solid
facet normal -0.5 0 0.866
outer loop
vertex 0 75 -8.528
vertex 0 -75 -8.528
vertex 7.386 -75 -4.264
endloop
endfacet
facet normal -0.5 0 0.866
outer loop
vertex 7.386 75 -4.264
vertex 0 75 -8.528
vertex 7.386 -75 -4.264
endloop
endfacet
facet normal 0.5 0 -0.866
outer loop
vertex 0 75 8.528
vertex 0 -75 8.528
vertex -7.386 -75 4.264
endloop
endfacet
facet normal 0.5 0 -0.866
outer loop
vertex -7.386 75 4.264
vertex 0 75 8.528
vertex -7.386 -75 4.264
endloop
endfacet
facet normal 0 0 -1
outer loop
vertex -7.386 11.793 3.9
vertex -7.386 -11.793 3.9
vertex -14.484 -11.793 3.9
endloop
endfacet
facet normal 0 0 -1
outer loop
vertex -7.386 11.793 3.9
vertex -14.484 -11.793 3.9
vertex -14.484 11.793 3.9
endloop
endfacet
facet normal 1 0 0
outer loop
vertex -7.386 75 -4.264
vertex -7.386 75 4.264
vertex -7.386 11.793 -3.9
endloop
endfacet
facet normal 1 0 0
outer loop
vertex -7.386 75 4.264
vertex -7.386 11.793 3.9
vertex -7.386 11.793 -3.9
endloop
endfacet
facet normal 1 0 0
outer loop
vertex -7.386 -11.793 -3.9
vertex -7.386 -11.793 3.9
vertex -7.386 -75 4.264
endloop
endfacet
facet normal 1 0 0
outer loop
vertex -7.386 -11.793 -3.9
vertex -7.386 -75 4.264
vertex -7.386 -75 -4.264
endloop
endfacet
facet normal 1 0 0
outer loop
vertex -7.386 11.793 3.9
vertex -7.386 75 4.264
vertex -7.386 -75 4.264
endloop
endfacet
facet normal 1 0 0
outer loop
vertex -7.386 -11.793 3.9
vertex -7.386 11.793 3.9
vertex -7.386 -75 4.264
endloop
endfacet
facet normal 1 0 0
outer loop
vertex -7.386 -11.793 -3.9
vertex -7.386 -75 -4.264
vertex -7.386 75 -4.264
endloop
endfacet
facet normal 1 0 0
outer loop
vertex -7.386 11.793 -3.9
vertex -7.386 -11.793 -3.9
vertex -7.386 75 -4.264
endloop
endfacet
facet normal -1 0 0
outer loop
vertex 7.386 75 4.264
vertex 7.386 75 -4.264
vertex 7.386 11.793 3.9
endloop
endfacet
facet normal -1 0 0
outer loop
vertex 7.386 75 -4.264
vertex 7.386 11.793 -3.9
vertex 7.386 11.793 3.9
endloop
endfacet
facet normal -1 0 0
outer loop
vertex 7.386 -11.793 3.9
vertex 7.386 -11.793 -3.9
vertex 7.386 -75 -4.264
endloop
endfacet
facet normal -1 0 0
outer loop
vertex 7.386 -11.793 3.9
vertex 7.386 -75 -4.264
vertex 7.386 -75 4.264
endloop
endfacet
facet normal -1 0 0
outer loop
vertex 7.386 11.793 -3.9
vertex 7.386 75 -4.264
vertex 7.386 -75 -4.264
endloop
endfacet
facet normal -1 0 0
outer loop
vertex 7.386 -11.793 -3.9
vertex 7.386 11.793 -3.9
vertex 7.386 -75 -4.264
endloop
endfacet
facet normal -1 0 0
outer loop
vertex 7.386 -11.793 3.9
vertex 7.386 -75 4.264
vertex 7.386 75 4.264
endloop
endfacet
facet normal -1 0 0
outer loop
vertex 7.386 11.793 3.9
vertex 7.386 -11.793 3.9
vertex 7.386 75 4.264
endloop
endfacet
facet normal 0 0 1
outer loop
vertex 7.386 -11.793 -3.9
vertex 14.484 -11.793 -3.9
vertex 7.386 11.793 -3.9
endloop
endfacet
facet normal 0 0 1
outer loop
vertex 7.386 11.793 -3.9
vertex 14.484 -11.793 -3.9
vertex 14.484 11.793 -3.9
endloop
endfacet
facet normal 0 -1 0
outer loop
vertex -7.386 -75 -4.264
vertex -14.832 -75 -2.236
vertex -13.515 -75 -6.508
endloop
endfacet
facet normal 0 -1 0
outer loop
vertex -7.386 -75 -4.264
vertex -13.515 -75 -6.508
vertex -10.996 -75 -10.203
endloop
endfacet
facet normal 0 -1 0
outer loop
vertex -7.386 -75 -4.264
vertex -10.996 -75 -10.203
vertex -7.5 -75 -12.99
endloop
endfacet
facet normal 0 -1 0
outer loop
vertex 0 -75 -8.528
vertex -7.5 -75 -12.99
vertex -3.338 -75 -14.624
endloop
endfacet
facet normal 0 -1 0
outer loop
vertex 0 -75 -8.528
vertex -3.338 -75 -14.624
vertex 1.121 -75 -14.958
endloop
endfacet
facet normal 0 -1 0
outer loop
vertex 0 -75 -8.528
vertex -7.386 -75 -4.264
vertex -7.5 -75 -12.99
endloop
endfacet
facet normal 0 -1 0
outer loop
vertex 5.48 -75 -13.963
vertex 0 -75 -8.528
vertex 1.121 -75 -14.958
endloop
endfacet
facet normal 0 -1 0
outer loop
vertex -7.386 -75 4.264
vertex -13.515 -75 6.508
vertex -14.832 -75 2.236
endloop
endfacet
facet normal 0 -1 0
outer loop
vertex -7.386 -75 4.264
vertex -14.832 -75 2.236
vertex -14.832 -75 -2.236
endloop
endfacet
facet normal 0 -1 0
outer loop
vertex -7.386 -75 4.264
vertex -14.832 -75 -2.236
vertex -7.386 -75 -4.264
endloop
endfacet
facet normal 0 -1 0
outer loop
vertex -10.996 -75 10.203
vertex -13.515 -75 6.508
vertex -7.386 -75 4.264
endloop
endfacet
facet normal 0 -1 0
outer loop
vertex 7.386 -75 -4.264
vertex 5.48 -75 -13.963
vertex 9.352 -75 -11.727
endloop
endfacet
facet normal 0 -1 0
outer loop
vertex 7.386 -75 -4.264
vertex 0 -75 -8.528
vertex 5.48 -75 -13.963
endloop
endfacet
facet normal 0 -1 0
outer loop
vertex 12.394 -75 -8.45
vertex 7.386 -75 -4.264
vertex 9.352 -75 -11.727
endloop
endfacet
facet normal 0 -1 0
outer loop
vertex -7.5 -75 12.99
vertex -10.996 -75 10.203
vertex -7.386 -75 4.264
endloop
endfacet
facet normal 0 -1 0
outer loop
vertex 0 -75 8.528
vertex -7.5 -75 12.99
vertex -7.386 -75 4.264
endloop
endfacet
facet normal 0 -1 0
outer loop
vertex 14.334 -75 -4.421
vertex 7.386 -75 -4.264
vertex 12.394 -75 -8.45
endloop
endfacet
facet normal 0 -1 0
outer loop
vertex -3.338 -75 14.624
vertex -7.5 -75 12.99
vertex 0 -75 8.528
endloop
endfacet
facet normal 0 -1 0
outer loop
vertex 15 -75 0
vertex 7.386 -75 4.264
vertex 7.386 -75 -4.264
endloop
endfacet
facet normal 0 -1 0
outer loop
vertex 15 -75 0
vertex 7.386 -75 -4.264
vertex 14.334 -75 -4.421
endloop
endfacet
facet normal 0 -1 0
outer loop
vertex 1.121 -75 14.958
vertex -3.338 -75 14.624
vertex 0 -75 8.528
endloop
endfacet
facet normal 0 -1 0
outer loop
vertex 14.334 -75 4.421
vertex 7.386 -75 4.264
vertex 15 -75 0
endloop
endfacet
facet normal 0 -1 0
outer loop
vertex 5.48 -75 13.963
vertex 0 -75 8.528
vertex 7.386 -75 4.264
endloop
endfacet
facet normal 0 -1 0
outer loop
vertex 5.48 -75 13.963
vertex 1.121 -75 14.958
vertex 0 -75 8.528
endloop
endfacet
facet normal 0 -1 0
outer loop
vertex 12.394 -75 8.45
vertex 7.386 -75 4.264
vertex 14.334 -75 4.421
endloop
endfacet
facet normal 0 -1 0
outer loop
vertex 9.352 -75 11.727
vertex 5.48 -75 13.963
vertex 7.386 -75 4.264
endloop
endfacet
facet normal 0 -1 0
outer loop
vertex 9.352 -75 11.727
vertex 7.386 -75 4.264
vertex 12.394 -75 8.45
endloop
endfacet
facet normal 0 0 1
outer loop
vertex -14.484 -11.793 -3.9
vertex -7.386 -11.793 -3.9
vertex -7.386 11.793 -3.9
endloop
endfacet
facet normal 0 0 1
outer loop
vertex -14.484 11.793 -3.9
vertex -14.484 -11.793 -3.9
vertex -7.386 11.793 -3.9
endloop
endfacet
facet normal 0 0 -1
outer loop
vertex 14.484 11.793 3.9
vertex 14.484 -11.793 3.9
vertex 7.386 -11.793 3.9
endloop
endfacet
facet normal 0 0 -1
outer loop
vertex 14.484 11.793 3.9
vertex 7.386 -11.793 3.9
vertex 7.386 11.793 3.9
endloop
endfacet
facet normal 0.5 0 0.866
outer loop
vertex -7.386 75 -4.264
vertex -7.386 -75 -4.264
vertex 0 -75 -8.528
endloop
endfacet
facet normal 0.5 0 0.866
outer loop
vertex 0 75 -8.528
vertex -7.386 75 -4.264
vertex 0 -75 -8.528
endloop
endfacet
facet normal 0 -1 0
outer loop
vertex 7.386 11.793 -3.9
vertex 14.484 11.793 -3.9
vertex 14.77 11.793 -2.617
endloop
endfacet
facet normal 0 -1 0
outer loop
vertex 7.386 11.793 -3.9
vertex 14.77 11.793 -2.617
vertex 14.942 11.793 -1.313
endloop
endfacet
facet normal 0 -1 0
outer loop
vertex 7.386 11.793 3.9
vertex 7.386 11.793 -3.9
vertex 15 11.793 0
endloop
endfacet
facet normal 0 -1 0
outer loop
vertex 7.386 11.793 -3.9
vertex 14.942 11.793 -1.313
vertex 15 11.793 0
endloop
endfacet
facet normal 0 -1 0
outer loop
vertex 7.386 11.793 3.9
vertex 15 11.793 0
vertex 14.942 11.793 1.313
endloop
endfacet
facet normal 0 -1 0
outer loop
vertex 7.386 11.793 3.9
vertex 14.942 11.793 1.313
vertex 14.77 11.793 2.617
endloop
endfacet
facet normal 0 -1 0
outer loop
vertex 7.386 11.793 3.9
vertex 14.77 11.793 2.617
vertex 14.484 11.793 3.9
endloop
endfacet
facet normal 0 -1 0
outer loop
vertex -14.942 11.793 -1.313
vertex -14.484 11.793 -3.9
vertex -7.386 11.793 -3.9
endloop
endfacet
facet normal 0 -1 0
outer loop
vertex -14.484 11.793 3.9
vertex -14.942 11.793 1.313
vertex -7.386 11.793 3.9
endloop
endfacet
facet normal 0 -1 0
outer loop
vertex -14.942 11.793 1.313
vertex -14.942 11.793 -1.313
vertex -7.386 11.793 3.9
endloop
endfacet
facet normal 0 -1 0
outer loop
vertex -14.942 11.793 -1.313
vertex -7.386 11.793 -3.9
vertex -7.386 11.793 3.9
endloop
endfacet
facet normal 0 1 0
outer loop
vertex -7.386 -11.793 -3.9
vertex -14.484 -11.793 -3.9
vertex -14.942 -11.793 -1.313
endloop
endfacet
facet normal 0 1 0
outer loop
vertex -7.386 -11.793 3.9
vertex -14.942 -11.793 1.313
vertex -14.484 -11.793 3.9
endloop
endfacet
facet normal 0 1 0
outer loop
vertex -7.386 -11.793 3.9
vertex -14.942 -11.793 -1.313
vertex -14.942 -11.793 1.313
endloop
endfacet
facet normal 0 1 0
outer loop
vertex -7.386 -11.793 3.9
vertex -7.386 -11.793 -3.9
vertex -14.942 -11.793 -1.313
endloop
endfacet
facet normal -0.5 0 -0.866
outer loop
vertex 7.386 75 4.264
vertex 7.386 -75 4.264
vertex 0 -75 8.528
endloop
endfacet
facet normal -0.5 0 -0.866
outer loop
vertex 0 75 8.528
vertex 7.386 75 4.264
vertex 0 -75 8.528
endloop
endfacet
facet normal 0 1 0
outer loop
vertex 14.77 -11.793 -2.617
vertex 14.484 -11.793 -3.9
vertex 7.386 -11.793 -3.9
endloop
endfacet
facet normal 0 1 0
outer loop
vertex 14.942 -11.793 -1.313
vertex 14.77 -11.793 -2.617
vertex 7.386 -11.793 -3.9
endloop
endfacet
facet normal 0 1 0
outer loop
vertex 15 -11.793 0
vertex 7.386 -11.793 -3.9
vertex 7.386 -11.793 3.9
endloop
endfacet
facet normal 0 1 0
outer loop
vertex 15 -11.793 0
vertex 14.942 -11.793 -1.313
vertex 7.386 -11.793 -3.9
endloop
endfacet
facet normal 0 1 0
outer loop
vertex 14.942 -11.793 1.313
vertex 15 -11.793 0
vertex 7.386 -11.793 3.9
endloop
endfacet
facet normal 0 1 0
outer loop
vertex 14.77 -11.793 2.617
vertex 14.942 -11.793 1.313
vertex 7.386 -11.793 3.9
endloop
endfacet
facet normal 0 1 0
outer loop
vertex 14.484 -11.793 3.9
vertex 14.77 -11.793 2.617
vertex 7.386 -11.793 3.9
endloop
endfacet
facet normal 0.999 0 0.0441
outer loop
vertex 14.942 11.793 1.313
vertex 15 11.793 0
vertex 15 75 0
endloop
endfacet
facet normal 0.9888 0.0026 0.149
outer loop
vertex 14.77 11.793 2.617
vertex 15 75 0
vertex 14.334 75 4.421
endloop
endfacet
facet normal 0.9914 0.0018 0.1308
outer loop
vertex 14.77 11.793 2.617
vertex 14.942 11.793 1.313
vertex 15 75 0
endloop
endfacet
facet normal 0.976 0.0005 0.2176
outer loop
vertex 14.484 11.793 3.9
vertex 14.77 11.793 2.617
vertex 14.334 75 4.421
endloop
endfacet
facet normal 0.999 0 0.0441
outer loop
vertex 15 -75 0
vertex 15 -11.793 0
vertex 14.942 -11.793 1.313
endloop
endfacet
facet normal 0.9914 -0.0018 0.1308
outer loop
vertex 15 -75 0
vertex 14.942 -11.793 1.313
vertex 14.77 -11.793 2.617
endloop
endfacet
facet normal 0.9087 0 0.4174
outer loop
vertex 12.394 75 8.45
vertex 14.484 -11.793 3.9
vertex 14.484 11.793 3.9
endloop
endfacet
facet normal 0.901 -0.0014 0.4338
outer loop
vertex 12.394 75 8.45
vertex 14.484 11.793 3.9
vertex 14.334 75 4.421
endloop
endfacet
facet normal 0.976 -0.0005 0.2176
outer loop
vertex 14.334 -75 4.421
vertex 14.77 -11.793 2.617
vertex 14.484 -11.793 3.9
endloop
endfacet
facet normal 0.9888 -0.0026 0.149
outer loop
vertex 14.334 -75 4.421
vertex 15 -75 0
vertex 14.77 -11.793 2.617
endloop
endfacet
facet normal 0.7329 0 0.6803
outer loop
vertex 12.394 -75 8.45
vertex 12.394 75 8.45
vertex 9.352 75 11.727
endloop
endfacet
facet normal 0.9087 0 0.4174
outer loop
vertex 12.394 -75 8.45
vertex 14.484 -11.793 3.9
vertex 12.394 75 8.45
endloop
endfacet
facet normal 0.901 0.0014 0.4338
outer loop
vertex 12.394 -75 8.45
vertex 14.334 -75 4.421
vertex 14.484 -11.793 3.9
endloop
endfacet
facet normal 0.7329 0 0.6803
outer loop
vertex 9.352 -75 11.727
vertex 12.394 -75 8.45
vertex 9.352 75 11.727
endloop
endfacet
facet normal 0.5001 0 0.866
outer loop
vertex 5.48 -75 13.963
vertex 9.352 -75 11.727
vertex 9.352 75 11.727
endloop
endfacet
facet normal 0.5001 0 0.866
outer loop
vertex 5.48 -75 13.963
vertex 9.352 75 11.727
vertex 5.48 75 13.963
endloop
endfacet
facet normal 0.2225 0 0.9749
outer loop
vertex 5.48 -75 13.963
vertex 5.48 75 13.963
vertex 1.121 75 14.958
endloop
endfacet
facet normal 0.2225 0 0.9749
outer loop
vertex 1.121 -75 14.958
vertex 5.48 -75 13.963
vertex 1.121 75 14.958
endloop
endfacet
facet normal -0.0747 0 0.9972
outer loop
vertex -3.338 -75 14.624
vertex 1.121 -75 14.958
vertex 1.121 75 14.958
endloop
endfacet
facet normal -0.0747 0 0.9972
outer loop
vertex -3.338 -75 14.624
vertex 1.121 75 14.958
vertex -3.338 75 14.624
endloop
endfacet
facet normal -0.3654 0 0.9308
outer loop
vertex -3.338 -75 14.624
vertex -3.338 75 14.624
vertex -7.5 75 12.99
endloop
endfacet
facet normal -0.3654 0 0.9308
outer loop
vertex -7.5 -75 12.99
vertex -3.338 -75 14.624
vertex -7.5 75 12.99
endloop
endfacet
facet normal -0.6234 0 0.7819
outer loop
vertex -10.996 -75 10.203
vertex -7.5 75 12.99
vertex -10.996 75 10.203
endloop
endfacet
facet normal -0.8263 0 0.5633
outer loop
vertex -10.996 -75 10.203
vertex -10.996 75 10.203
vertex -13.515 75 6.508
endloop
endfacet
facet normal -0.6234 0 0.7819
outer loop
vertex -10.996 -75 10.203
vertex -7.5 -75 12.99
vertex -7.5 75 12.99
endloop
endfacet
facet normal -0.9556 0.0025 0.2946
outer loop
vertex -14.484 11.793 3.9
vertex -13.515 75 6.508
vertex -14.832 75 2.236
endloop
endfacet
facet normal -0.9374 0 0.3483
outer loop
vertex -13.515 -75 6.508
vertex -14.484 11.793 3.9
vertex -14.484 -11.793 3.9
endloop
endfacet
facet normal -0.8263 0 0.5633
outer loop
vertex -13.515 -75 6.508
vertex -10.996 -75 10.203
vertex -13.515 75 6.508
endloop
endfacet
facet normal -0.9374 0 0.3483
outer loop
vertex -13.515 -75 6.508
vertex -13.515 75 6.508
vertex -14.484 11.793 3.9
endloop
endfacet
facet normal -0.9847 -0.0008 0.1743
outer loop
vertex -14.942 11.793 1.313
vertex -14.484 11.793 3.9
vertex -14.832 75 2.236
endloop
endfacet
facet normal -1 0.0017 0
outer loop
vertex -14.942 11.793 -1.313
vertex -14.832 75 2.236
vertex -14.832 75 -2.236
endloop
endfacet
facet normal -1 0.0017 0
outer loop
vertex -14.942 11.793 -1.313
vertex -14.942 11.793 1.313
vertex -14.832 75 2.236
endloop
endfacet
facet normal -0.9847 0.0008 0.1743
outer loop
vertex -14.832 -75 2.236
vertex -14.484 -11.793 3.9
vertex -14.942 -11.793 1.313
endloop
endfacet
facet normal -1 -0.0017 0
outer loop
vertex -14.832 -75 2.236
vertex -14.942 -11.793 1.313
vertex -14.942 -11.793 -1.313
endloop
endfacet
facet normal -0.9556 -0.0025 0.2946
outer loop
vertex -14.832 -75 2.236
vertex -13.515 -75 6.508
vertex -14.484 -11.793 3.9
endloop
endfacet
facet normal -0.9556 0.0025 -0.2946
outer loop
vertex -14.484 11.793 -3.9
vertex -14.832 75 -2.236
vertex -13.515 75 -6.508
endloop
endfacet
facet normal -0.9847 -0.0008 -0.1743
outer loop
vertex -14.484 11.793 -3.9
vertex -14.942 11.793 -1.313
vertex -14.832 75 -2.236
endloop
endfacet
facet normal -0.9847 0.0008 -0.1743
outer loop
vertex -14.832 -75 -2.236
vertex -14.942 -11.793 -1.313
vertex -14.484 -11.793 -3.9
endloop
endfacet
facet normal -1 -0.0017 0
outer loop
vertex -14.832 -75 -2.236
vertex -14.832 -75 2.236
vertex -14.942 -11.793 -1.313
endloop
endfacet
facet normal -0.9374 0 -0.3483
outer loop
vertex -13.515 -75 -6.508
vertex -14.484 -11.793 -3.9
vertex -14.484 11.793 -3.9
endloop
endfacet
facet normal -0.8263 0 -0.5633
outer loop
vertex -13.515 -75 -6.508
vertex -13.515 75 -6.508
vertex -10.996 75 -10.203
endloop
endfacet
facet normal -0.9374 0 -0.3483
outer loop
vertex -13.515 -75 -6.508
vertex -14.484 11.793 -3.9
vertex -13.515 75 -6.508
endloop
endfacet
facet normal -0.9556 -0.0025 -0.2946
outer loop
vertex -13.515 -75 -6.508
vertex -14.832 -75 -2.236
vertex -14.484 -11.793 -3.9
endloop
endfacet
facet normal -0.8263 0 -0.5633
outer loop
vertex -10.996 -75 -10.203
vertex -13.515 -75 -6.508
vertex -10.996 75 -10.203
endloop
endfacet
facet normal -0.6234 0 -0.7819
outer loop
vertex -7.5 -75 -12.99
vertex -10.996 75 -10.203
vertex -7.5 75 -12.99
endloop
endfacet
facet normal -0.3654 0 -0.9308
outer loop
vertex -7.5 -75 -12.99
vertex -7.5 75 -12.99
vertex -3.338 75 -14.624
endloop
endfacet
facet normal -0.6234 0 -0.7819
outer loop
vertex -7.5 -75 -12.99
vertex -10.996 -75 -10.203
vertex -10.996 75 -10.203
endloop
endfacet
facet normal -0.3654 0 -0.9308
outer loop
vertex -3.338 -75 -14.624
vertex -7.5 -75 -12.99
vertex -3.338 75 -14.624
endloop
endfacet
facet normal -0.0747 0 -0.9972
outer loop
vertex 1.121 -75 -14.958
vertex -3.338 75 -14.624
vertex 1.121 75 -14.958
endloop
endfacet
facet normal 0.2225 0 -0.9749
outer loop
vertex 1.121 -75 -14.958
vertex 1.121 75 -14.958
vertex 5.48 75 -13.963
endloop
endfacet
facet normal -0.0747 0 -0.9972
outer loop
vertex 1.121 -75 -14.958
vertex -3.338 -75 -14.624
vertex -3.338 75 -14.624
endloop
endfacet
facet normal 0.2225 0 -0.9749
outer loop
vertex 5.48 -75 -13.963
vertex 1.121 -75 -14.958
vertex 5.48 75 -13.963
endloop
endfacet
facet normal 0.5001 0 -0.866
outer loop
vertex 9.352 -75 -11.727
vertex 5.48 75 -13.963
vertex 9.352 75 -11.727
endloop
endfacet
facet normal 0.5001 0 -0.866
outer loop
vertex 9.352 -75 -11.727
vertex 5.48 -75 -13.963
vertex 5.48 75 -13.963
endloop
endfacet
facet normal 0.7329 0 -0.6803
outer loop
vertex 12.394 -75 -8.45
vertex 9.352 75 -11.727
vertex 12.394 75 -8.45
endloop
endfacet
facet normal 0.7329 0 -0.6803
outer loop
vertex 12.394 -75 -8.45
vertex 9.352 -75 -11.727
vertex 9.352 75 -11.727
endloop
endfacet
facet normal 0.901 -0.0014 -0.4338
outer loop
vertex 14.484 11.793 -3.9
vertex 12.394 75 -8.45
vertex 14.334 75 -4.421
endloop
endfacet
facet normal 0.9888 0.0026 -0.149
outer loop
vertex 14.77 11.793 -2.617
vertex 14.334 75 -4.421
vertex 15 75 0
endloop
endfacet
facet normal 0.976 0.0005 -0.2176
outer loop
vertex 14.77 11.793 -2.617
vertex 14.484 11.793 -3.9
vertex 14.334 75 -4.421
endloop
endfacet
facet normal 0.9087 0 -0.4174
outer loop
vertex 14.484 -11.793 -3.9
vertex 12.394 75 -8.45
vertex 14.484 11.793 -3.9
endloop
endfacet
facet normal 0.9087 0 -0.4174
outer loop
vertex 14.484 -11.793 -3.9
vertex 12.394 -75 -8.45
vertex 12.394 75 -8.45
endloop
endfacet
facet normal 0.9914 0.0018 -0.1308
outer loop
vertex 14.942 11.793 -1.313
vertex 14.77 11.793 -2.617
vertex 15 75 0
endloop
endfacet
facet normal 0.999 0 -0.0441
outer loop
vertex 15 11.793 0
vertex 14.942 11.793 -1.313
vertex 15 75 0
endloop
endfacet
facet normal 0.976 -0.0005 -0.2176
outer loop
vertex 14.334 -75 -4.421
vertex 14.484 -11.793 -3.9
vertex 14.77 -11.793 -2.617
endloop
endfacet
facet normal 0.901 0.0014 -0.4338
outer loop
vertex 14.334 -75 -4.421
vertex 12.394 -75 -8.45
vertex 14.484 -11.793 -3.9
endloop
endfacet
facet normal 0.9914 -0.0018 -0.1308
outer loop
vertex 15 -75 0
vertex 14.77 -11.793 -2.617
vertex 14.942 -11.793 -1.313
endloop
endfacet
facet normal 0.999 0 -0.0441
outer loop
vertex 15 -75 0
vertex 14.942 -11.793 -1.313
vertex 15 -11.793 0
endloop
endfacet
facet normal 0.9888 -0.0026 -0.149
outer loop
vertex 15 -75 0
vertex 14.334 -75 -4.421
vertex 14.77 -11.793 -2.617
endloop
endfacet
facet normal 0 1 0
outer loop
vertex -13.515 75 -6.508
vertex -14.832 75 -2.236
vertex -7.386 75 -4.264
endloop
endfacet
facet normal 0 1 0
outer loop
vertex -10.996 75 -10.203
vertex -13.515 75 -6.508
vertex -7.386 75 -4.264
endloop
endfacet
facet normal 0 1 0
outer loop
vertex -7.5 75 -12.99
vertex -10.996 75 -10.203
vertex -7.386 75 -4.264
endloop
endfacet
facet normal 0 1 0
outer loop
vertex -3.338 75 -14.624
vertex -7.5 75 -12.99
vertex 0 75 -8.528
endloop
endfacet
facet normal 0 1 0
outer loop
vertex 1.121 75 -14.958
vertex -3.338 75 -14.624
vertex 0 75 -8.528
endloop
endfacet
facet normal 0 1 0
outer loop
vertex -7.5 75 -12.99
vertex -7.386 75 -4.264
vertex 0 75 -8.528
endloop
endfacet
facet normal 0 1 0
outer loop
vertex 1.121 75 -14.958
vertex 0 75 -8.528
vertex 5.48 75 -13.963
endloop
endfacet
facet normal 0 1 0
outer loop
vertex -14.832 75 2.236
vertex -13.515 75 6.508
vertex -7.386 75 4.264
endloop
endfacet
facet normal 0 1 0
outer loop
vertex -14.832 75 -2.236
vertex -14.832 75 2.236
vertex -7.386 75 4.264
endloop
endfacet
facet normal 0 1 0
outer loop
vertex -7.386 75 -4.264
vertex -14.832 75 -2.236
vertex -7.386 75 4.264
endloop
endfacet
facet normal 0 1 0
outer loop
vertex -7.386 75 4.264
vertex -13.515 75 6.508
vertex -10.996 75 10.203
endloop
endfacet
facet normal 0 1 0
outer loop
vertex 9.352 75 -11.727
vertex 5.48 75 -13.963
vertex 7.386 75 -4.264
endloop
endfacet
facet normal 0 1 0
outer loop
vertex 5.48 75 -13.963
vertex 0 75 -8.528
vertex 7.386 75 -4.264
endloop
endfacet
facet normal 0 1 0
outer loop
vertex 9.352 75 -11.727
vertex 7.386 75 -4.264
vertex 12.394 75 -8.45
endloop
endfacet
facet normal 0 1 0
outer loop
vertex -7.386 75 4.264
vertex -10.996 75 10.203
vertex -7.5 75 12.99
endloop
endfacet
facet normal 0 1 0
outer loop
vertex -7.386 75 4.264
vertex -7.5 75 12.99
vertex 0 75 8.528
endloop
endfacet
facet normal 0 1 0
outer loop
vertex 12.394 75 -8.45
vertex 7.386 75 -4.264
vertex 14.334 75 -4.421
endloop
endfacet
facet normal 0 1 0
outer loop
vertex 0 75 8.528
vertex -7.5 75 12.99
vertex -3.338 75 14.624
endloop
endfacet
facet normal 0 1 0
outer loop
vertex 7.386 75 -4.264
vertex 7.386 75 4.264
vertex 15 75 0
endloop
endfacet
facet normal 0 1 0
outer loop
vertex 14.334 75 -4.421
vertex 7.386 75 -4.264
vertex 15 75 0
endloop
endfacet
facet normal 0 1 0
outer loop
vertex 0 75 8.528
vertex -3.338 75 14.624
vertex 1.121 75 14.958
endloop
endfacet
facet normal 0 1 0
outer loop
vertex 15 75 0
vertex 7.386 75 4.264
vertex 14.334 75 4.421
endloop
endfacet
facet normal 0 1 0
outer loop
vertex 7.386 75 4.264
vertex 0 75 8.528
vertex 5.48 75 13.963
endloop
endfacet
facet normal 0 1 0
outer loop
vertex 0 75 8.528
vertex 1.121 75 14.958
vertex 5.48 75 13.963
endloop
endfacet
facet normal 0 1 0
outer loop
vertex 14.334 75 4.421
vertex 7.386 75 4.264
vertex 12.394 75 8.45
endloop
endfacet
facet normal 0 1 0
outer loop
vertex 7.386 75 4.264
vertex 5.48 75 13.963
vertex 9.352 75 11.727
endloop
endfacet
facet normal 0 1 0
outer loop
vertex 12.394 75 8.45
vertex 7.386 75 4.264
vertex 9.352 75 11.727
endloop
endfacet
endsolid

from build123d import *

# Parameters (mm, degrees)
F0_R     = 15
F1_DEPTH = 75
F3_DEPTH = 150
F4_W     = 23.585714
F4_H     = 7.8
F5_DEPTH = 21


with BuildPart() as f1:
    # F0 (on Front) → F1 (new body, symmetric)
    with BuildSketch(Plane.XZ):
        Circle(F0_R)
    extrude(amount=F1_DEPTH, both=True)

    # F2 (on face) → F3 (cut, symmetric)
    with BuildSketch(Plane.XZ.offset(75)):
        Polygon((-7.38566, -4.264113), (0, -8.528226), (7.38566, -4.264113), (7.38566, 4.264113), (0, 8.528226), (-7.38566, 4.264113), align=None)
    extrude(amount=F3_DEPTH, both=True, mode=Mode.SUBTRACT)

    # F4 (on Right) → F5 (cut, symmetric)
    with BuildSketch(Plane.YZ):
        Rectangle(F4_W, F4_H)
    extrude(amount=F5_DEPTH, both=True, mode=Mode.SUBTRACT)


solid = f1.part
